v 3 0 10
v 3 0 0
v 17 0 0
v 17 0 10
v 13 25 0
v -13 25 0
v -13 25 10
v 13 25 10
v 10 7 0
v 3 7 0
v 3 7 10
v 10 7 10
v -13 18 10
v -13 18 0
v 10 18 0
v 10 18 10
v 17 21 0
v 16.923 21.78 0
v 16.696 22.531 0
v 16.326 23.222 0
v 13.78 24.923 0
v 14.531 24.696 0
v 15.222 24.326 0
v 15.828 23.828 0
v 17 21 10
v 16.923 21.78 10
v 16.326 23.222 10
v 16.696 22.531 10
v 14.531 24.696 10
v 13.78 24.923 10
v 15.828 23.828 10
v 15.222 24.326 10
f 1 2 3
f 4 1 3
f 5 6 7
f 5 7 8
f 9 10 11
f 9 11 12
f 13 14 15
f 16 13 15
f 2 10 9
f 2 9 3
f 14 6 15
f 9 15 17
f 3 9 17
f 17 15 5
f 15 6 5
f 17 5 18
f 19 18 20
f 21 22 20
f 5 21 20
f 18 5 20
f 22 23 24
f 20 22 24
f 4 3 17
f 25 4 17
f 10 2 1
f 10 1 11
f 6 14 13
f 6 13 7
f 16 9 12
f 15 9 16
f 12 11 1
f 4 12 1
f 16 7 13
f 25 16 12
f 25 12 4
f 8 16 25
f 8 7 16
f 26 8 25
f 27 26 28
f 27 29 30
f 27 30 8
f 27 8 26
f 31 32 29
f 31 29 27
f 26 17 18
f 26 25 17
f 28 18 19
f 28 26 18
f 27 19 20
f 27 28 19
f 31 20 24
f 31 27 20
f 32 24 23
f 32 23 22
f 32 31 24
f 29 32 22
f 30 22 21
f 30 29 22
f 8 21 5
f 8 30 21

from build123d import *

# Parameters (mm, degrees)
BOX001_W     = 7
BOX001_H     = 25
BOX001_DEPTH = 10
FILLET_R     = 4
BOX_W        = 7
BOX_H        = 7
BOX_DEPTH    = 10
BOX002_W     = 23
BOX002_H     = 7
BOX002_DEPTH = 10


with BuildPart() as fillet_body:
    # Box001 → Box001 (new body)
    with BuildSketch(Plane(origin=(10, 0, 0), x_dir=(1, 0, 0), z_dir=(0, 0, 1))):
        with Locations((3.5, 12.5)):
            Rectangle(BOX001_W, BOX001_H)
    extrude(amount=BOX001_DEPTH)

    # Fillet
    fillet_edges = [fillet_body.edges().sort_by_distance(p)[0] for p in [
        (17, 25, 5),
    ]]
    fillet(fillet_edges, radius=FILLET_R)


with BuildPart() as cubo:
    # Box → Box (new body)
    with BuildSketch(Plane(origin=(3, 0, 0), x_dir=(1, 0, 0), z_dir=(0, 0, 1))):
        with Locations((3.5, 3.5)):
            Rectangle(BOX_W, BOX_H)
    extrude(amount=BOX_DEPTH)


with BuildPart() as fusion:
    # Box002 → Box002 (new body)
    with BuildSketch(Plane(origin=(-13, 18, 0), x_dir=(1, 0, 0), z_dir=(0, 0, 1))):
        with Locations((11.5, 3.5)):
            Rectangle(BOX002_W, BOX002_H)
    extrude(amount=BOX002_DEPTH)

    # Fusion: union Fillet body, Cubo
    add(fillet_body.part)
    add(cubo.part)


solid = fusion.part
